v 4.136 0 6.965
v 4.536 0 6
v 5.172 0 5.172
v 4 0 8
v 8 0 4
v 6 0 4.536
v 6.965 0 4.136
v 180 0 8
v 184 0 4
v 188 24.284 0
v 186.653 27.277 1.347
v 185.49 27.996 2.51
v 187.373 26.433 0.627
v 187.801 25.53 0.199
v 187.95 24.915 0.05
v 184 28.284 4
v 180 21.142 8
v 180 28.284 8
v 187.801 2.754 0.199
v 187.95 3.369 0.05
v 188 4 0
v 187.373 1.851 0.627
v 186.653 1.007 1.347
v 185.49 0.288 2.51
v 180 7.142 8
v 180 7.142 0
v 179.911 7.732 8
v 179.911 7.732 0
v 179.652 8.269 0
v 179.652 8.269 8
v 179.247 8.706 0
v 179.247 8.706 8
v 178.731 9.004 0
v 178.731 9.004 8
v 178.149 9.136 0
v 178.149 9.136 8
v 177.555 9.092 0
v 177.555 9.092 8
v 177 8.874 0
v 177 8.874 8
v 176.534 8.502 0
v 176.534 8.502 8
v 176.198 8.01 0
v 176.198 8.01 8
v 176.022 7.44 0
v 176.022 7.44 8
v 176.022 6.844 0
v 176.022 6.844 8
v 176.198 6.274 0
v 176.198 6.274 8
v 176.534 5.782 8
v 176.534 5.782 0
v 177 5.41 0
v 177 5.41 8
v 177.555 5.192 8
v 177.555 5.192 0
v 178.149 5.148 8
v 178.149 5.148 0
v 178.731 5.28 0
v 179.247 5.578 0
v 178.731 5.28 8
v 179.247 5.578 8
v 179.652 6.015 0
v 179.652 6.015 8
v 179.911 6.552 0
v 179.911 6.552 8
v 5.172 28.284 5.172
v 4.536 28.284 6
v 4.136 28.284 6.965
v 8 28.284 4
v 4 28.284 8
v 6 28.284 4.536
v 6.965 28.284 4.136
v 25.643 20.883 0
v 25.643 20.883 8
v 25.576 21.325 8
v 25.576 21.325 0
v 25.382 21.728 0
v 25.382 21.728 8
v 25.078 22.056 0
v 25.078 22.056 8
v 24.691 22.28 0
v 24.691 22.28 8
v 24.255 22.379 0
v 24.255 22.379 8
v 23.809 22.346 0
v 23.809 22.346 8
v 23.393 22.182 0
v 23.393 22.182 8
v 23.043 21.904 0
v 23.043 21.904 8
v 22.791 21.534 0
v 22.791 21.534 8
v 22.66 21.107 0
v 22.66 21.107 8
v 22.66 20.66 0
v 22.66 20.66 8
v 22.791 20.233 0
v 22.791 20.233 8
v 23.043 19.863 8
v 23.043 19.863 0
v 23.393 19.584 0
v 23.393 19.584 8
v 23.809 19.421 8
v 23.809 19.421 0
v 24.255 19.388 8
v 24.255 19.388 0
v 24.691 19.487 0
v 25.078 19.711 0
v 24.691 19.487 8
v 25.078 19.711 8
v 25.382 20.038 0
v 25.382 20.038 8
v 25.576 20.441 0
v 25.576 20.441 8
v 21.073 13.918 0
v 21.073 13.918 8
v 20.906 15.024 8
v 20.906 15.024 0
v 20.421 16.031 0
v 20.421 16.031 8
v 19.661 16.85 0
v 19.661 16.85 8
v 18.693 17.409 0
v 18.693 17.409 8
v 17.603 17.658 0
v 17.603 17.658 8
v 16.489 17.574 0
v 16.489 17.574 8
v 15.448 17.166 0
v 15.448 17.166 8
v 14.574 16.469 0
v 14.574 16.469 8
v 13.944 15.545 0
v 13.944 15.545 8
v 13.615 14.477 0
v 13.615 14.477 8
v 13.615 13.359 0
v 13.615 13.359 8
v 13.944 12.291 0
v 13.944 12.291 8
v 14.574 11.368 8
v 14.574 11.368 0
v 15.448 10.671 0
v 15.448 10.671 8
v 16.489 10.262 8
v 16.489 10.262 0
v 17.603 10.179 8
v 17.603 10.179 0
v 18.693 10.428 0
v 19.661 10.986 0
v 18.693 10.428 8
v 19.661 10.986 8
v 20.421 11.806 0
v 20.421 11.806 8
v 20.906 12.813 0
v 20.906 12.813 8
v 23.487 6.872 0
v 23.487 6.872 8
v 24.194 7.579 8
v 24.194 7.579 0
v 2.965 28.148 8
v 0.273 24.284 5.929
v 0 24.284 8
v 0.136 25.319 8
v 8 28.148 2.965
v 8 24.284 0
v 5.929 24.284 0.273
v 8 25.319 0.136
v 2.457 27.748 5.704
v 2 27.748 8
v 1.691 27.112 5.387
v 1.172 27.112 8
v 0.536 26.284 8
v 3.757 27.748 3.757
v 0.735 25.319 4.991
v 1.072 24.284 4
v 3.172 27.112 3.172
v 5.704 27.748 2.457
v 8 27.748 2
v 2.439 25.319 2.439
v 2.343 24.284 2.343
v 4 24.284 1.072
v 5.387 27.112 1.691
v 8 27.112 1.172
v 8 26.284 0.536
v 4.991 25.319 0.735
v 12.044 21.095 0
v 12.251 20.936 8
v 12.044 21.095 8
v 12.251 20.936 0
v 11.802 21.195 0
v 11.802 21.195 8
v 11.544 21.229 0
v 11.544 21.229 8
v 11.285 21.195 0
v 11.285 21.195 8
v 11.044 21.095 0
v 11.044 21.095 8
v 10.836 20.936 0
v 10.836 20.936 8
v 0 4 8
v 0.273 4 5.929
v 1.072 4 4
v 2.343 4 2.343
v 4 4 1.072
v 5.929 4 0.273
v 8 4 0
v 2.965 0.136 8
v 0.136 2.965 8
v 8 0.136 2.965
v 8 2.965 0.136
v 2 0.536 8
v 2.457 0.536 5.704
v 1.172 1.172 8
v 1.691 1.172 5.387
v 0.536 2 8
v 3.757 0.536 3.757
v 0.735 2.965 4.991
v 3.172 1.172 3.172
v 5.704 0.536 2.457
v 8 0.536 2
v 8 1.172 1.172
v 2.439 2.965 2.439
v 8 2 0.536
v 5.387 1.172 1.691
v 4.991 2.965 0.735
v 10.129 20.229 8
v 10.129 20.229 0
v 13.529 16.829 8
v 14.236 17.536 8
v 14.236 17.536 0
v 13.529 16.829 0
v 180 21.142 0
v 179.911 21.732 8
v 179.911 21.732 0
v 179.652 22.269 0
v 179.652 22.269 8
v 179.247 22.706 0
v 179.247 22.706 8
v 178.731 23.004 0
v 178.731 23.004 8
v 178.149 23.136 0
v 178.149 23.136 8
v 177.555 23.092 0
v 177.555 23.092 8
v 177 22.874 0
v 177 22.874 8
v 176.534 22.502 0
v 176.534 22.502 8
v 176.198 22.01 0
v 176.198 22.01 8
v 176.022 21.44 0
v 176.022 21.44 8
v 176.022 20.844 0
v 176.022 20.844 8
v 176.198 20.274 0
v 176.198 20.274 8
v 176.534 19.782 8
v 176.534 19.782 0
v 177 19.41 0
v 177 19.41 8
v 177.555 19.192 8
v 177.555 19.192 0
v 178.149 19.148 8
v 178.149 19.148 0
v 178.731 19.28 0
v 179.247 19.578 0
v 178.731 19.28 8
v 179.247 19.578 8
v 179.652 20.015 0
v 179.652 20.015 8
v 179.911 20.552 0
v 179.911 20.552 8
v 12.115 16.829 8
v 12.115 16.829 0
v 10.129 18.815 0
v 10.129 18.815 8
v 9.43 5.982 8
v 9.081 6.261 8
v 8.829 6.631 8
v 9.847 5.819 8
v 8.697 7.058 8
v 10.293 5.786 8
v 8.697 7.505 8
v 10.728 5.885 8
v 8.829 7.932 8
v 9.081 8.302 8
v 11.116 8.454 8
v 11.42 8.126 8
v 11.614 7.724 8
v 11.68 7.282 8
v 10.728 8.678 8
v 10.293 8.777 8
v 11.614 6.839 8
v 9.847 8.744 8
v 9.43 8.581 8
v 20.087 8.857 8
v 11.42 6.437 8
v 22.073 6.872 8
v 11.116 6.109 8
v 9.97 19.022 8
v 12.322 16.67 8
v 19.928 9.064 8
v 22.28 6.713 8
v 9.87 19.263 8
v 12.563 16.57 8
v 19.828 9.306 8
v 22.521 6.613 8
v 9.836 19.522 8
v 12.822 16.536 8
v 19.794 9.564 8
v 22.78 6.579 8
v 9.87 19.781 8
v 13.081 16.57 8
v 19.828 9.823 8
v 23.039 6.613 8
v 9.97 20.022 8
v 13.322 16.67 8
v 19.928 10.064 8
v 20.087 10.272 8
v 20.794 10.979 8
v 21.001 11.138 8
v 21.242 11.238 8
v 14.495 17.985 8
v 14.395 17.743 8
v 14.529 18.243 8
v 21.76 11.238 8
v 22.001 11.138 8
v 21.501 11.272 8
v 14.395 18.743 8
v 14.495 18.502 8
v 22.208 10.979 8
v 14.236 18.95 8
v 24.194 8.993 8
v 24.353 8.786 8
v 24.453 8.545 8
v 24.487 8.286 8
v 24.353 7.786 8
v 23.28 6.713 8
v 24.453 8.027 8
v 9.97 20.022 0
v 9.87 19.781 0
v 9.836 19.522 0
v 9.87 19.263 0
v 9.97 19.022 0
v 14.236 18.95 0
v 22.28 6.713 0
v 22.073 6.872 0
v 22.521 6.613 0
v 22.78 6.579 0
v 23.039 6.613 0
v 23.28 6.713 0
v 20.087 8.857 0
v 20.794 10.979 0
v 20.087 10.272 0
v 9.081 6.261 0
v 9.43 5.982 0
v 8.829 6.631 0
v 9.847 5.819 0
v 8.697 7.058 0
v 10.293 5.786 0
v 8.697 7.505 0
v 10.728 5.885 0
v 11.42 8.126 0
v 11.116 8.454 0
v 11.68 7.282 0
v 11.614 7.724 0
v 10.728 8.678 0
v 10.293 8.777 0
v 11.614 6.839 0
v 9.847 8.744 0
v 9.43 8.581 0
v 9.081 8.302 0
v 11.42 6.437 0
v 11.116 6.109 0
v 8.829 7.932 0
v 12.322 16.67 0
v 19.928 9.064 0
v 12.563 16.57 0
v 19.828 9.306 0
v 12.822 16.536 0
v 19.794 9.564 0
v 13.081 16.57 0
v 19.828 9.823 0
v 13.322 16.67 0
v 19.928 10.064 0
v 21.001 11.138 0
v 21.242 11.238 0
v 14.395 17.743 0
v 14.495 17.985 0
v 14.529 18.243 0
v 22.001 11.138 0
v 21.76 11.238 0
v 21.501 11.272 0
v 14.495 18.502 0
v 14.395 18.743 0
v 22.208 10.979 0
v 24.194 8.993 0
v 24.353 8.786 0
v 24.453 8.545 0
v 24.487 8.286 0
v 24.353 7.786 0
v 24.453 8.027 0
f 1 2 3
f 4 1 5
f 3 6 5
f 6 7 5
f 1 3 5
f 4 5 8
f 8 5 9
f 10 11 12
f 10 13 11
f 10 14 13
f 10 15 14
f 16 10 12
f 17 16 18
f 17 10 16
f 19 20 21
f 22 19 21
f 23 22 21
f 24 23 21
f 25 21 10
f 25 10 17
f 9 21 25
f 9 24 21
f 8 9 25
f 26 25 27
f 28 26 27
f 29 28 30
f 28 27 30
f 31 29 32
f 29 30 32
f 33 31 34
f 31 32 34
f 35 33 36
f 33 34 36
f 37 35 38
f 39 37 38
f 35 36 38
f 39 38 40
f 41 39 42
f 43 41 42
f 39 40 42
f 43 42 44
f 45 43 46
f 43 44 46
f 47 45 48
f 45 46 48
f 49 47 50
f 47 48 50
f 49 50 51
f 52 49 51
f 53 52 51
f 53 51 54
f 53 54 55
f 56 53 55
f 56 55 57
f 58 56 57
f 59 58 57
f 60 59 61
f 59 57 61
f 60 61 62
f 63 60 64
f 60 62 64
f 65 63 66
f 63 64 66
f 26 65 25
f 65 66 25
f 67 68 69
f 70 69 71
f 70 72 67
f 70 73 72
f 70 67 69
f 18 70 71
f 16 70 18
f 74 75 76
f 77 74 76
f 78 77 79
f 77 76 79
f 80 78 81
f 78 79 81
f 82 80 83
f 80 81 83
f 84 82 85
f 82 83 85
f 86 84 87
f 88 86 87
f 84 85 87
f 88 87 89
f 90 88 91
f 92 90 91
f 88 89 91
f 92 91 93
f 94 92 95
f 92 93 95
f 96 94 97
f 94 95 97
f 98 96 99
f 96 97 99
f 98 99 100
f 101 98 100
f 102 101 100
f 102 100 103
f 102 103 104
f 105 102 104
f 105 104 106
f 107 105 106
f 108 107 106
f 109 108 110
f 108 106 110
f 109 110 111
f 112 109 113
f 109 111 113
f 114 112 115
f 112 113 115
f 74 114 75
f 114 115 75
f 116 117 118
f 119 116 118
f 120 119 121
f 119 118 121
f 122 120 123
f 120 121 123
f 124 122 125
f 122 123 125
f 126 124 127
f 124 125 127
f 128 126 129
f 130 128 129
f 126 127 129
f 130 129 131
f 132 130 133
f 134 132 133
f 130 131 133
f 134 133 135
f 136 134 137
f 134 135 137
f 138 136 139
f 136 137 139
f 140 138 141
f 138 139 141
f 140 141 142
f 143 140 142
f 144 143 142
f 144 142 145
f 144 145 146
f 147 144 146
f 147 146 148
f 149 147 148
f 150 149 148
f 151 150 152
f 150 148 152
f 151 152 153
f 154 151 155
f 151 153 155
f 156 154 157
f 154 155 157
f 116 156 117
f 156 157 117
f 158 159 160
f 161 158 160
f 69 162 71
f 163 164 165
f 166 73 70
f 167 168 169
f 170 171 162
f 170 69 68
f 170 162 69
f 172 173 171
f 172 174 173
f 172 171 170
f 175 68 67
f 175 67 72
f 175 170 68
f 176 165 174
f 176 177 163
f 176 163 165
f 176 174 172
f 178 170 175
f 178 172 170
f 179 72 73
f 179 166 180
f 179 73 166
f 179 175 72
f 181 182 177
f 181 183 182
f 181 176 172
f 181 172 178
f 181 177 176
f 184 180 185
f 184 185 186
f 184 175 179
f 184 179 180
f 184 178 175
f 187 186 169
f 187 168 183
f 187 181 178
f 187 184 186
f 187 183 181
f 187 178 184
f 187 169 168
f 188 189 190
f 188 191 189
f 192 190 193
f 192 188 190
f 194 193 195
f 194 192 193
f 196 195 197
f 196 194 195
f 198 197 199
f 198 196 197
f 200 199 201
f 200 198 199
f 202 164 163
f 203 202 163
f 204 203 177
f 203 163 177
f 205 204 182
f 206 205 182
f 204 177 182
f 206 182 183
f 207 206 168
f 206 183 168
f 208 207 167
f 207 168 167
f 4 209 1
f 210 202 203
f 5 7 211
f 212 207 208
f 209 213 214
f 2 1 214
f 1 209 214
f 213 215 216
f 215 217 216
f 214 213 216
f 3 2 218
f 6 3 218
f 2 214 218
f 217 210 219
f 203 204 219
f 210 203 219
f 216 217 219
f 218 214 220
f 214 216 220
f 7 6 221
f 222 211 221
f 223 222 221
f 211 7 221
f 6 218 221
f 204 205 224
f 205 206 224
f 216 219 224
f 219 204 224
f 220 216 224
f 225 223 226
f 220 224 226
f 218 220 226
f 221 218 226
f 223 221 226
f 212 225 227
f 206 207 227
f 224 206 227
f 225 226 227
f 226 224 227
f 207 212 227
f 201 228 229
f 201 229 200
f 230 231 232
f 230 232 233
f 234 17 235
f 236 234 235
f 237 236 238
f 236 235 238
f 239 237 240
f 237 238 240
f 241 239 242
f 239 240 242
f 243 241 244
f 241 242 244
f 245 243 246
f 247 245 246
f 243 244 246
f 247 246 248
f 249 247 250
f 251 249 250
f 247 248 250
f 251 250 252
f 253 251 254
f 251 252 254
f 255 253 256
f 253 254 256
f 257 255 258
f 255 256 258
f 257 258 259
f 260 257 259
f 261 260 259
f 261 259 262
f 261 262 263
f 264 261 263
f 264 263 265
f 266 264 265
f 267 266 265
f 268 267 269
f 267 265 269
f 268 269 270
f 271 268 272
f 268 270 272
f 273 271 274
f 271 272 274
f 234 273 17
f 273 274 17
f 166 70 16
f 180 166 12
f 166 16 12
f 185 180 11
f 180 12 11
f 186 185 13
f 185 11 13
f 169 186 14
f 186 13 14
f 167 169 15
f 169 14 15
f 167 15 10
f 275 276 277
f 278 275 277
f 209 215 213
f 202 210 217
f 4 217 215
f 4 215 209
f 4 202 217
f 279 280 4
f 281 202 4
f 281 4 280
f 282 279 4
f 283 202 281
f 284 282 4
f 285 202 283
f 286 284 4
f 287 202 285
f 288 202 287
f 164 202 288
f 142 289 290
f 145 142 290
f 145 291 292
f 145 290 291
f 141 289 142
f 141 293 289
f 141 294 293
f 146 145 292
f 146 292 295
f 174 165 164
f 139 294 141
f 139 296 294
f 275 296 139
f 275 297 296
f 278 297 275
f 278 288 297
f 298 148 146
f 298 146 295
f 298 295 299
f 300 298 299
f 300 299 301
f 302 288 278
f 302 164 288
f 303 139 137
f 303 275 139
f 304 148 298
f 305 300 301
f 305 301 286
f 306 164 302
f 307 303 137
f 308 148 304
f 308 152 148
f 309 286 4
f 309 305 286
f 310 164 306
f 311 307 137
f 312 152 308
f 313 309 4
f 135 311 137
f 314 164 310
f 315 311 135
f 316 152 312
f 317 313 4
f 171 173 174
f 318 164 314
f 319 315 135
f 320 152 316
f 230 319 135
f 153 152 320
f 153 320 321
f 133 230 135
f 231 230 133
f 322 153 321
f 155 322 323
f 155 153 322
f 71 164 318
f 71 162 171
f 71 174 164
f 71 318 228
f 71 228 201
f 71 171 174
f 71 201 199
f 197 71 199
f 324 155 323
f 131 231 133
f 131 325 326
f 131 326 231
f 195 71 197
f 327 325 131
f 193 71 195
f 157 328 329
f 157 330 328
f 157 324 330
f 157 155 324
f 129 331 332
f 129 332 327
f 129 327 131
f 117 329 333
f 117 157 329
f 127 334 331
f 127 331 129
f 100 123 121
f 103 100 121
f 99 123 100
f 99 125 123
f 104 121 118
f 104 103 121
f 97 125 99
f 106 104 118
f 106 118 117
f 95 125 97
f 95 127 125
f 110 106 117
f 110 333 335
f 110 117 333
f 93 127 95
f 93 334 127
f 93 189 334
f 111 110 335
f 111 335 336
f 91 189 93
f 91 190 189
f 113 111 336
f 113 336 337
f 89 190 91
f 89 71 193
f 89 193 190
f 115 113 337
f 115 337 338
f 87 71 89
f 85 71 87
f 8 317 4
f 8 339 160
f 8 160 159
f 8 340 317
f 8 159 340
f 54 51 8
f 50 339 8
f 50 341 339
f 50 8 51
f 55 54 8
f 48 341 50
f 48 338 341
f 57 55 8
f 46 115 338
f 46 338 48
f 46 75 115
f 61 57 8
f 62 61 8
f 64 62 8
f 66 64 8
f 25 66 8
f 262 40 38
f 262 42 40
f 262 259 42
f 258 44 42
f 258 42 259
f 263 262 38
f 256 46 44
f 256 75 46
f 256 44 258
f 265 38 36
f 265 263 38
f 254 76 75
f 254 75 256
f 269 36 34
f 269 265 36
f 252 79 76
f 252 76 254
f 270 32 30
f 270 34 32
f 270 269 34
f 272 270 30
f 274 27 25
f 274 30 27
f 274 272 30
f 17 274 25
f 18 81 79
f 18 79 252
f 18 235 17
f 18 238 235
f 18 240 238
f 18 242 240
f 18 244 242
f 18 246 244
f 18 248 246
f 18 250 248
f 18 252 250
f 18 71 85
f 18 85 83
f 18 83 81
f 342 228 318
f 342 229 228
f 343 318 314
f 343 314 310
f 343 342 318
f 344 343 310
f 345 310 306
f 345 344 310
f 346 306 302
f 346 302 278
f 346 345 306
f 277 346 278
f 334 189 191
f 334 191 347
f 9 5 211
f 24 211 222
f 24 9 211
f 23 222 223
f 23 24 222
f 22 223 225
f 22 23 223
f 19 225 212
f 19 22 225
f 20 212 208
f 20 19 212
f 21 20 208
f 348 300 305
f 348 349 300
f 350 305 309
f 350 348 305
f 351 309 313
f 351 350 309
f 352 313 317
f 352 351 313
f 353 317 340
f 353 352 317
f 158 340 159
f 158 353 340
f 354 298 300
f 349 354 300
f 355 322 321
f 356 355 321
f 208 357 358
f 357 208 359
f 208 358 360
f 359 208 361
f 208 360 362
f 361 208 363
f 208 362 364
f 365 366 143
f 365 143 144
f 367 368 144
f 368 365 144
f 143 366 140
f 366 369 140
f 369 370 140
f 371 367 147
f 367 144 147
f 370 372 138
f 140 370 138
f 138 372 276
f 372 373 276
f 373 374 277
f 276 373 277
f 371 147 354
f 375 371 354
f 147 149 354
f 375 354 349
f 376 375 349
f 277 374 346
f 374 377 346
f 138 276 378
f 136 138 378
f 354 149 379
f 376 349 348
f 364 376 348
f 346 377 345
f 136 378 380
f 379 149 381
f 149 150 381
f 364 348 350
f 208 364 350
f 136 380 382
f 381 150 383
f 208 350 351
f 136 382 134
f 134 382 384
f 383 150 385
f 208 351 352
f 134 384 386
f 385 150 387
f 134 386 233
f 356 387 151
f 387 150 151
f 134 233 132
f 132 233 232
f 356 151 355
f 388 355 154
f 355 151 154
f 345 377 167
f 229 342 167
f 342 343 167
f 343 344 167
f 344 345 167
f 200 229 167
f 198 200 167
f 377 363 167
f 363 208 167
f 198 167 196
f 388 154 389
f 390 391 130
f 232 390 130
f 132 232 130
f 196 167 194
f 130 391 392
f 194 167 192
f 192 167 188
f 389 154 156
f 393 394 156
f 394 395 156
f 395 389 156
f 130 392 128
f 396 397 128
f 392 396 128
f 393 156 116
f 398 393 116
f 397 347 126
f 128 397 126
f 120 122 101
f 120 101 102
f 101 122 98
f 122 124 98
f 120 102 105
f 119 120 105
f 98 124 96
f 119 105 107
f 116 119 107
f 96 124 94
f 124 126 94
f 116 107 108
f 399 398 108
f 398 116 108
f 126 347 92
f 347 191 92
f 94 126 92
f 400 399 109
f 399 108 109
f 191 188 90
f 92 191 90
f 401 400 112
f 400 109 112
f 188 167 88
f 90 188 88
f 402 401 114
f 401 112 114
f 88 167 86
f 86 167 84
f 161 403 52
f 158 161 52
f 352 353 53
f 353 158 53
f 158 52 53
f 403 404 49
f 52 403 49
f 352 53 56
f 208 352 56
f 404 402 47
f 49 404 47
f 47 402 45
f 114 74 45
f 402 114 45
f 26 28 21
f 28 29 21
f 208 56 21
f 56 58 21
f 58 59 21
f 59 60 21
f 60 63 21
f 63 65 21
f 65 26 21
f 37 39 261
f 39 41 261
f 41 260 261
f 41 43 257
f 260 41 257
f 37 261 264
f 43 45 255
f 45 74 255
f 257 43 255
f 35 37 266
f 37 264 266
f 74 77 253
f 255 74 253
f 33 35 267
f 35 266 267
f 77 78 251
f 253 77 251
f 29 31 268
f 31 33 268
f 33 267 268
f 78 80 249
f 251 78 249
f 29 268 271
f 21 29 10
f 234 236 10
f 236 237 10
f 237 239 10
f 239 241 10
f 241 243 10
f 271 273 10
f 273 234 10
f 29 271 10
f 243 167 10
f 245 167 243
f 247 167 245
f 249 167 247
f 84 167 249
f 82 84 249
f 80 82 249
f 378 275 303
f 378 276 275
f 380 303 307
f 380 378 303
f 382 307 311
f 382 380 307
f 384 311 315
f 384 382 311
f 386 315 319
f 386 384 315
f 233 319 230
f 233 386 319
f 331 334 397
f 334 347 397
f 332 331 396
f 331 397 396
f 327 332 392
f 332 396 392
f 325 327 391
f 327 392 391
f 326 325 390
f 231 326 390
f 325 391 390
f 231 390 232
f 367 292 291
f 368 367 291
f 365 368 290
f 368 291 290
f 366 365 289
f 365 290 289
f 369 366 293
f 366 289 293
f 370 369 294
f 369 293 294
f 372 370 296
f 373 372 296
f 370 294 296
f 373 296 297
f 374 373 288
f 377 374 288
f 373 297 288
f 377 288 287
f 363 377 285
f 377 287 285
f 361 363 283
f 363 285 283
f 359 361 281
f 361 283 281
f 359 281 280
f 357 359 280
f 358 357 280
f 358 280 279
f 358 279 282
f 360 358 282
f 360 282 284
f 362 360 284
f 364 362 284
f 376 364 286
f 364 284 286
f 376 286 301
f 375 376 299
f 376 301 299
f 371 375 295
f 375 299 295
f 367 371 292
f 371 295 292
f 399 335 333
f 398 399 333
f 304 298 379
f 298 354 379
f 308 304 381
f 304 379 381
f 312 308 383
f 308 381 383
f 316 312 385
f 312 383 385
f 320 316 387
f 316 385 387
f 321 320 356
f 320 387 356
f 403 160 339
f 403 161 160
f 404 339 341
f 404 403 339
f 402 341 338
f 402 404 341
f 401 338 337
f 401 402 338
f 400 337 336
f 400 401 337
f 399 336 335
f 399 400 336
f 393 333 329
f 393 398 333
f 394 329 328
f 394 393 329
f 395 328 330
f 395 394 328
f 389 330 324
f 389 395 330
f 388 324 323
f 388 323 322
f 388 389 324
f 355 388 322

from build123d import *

# Parameters (mm, degrees)
ESQUISSE1_W             = 200
ESQUISSE1_H             = 28.284
BOSS_EXTRU_3_DEPTH      = 8
CHANFREIN1_SIZE         = 20
ESQUISSE4_R             = 2
ENL_V_MAT_EXTRU_1_DEPTH = 8
FILLET1_R               = 8
SKETCH2_R               = 1.5
SKETCH2_R_2             = 3.75
CUT_EXTRUDE1_DEPTH      = 8
FILLET9_R               = 1
FILLET10_R              = 1
FILLET4_R               = 4
FILLET5_R               = 4


# Some blends are built 0.0001 mm under size
with BuildPart() as part:
    # Esquisse1 → Boss.-Extru.3 (new body)
    with BuildSketch(Plane.XY):
        with Locations((100, 14.142)):
            Rectangle(ESQUISSE1_W, ESQUISSE1_H)
    extrude(amount=BOSS_EXTRU_3_DEPTH)

    # Chanfrein1
    # the kernel refuses this chamfer: 20 mm, written as the material it takes off along each edge
    with BuildSketch(Plane(origin=(200, -51.433659759, 8), x_dir=(0.027495876610586317, 0, -0.9996219169112968), z_dir=(0, 1, 0))) as chanfrein1_piece_1:
        Polygon((CHANFREIN1_SIZE * 0.999621916911, CHANFREIN1_SIZE * 0.0274958766106), (-CHANFREIN1_SIZE * 0.0274958766106, CHANFREIN1_SIZE * 0.999621916911), (0, 0), align=None)
    extrude(amount=131.151319519, mode=Mode.SUBTRACT)

    # Esquisse4 → Enlèv. mat.-Extru.1 (cut)
    with BuildSketch(Plane.XY.offset(8)):
        with Locations((178, 7.142)):
            Circle(ESQUISSE4_R)
        with Locations((178, 21.142)):
            Circle(ESQUISSE4_R)
    extrude(amount=-ENL_V_MAT_EXTRU_1_DEPTH, mode=Mode.SUBTRACT)

    # Fillet1
    fillet1_edges = [part.edges().sort_by_distance(p)[0] for p in [
        (0, 14.142, 0),
    ]]
    fillet(fillet1_edges, radius=FILLET1_R - 0.0001)  # a hair under: the kernel refuses the full size

    # Sketch2 → Cut-Extrude1 (cut)
    with BuildSketch(Plane.XY.offset(8)):
        with Locations((10.180485171, 7.281517741)):
            Circle(SKETCH2_R)
        with Locations((24.142857006, 20.883346587)):
            Circle(SKETCH2_R)
        with Locations((17.323003706, 13.918303783)):
            Circle(SKETCH2_R_2)
        Polygon((14.943517177, 18.243352736), (12.822196834, 16.122032392), (9.422196834, 19.522032392), (11.543517177, 21.643352736), align=None)
        Polygon((19.379761465, 9.564467761), (22.780003771, 6.164594852), (24.901208877, 8.286030428), (21.501081812, 11.685788108), align=None)
    extrude(amount=-CUT_EXTRUDE1_DEPTH, mode=Mode.SUBTRACT)

    # Fillet9
    fillet9_edges = [part.edges().sort_by_distance(p)[0] for p in [
        (9.422196834, 19.522032392, 4),
        (11.543517177, 21.643352736, 4),
        (14.943517177, 18.243352736, 4),
        (12.822196834, 16.122032392, 4),
    ]]
    fillet(fillet9_edges, radius=FILLET9_R)

    # Fillet10
    fillet10_edges = [part.edges().sort_by_distance(p)[0] for p in [
        (24.901208877, 8.286030428, 4),
        (22.780003771, 6.164594852, 4),
        (19.379761465, 9.564467761, 4),
        (21.501081812, 11.685788108, 4),
    ]]
    fillet(fillet10_edges, radius=FILLET10_R)

    # Fillet4
    fillet4_edges = [part.edges().sort_by_distance(p)[0] for p in [
        (97.99995, 0, 0),
        (2.343116461, 0, 2.343116461),
    ]]
    fillet(fillet4_edges, radius=FILLET4_R)

    # Fillet5
    fillet5_edges = [part.edges().sort_by_distance(p)[0] for p in [
        (97.99995, 28.284, 0),
        (2.343116461, 28.284, 2.343116461),
    ]]
    fillet(fillet5_edges, radius=FILLET5_R)


solid = part.part
